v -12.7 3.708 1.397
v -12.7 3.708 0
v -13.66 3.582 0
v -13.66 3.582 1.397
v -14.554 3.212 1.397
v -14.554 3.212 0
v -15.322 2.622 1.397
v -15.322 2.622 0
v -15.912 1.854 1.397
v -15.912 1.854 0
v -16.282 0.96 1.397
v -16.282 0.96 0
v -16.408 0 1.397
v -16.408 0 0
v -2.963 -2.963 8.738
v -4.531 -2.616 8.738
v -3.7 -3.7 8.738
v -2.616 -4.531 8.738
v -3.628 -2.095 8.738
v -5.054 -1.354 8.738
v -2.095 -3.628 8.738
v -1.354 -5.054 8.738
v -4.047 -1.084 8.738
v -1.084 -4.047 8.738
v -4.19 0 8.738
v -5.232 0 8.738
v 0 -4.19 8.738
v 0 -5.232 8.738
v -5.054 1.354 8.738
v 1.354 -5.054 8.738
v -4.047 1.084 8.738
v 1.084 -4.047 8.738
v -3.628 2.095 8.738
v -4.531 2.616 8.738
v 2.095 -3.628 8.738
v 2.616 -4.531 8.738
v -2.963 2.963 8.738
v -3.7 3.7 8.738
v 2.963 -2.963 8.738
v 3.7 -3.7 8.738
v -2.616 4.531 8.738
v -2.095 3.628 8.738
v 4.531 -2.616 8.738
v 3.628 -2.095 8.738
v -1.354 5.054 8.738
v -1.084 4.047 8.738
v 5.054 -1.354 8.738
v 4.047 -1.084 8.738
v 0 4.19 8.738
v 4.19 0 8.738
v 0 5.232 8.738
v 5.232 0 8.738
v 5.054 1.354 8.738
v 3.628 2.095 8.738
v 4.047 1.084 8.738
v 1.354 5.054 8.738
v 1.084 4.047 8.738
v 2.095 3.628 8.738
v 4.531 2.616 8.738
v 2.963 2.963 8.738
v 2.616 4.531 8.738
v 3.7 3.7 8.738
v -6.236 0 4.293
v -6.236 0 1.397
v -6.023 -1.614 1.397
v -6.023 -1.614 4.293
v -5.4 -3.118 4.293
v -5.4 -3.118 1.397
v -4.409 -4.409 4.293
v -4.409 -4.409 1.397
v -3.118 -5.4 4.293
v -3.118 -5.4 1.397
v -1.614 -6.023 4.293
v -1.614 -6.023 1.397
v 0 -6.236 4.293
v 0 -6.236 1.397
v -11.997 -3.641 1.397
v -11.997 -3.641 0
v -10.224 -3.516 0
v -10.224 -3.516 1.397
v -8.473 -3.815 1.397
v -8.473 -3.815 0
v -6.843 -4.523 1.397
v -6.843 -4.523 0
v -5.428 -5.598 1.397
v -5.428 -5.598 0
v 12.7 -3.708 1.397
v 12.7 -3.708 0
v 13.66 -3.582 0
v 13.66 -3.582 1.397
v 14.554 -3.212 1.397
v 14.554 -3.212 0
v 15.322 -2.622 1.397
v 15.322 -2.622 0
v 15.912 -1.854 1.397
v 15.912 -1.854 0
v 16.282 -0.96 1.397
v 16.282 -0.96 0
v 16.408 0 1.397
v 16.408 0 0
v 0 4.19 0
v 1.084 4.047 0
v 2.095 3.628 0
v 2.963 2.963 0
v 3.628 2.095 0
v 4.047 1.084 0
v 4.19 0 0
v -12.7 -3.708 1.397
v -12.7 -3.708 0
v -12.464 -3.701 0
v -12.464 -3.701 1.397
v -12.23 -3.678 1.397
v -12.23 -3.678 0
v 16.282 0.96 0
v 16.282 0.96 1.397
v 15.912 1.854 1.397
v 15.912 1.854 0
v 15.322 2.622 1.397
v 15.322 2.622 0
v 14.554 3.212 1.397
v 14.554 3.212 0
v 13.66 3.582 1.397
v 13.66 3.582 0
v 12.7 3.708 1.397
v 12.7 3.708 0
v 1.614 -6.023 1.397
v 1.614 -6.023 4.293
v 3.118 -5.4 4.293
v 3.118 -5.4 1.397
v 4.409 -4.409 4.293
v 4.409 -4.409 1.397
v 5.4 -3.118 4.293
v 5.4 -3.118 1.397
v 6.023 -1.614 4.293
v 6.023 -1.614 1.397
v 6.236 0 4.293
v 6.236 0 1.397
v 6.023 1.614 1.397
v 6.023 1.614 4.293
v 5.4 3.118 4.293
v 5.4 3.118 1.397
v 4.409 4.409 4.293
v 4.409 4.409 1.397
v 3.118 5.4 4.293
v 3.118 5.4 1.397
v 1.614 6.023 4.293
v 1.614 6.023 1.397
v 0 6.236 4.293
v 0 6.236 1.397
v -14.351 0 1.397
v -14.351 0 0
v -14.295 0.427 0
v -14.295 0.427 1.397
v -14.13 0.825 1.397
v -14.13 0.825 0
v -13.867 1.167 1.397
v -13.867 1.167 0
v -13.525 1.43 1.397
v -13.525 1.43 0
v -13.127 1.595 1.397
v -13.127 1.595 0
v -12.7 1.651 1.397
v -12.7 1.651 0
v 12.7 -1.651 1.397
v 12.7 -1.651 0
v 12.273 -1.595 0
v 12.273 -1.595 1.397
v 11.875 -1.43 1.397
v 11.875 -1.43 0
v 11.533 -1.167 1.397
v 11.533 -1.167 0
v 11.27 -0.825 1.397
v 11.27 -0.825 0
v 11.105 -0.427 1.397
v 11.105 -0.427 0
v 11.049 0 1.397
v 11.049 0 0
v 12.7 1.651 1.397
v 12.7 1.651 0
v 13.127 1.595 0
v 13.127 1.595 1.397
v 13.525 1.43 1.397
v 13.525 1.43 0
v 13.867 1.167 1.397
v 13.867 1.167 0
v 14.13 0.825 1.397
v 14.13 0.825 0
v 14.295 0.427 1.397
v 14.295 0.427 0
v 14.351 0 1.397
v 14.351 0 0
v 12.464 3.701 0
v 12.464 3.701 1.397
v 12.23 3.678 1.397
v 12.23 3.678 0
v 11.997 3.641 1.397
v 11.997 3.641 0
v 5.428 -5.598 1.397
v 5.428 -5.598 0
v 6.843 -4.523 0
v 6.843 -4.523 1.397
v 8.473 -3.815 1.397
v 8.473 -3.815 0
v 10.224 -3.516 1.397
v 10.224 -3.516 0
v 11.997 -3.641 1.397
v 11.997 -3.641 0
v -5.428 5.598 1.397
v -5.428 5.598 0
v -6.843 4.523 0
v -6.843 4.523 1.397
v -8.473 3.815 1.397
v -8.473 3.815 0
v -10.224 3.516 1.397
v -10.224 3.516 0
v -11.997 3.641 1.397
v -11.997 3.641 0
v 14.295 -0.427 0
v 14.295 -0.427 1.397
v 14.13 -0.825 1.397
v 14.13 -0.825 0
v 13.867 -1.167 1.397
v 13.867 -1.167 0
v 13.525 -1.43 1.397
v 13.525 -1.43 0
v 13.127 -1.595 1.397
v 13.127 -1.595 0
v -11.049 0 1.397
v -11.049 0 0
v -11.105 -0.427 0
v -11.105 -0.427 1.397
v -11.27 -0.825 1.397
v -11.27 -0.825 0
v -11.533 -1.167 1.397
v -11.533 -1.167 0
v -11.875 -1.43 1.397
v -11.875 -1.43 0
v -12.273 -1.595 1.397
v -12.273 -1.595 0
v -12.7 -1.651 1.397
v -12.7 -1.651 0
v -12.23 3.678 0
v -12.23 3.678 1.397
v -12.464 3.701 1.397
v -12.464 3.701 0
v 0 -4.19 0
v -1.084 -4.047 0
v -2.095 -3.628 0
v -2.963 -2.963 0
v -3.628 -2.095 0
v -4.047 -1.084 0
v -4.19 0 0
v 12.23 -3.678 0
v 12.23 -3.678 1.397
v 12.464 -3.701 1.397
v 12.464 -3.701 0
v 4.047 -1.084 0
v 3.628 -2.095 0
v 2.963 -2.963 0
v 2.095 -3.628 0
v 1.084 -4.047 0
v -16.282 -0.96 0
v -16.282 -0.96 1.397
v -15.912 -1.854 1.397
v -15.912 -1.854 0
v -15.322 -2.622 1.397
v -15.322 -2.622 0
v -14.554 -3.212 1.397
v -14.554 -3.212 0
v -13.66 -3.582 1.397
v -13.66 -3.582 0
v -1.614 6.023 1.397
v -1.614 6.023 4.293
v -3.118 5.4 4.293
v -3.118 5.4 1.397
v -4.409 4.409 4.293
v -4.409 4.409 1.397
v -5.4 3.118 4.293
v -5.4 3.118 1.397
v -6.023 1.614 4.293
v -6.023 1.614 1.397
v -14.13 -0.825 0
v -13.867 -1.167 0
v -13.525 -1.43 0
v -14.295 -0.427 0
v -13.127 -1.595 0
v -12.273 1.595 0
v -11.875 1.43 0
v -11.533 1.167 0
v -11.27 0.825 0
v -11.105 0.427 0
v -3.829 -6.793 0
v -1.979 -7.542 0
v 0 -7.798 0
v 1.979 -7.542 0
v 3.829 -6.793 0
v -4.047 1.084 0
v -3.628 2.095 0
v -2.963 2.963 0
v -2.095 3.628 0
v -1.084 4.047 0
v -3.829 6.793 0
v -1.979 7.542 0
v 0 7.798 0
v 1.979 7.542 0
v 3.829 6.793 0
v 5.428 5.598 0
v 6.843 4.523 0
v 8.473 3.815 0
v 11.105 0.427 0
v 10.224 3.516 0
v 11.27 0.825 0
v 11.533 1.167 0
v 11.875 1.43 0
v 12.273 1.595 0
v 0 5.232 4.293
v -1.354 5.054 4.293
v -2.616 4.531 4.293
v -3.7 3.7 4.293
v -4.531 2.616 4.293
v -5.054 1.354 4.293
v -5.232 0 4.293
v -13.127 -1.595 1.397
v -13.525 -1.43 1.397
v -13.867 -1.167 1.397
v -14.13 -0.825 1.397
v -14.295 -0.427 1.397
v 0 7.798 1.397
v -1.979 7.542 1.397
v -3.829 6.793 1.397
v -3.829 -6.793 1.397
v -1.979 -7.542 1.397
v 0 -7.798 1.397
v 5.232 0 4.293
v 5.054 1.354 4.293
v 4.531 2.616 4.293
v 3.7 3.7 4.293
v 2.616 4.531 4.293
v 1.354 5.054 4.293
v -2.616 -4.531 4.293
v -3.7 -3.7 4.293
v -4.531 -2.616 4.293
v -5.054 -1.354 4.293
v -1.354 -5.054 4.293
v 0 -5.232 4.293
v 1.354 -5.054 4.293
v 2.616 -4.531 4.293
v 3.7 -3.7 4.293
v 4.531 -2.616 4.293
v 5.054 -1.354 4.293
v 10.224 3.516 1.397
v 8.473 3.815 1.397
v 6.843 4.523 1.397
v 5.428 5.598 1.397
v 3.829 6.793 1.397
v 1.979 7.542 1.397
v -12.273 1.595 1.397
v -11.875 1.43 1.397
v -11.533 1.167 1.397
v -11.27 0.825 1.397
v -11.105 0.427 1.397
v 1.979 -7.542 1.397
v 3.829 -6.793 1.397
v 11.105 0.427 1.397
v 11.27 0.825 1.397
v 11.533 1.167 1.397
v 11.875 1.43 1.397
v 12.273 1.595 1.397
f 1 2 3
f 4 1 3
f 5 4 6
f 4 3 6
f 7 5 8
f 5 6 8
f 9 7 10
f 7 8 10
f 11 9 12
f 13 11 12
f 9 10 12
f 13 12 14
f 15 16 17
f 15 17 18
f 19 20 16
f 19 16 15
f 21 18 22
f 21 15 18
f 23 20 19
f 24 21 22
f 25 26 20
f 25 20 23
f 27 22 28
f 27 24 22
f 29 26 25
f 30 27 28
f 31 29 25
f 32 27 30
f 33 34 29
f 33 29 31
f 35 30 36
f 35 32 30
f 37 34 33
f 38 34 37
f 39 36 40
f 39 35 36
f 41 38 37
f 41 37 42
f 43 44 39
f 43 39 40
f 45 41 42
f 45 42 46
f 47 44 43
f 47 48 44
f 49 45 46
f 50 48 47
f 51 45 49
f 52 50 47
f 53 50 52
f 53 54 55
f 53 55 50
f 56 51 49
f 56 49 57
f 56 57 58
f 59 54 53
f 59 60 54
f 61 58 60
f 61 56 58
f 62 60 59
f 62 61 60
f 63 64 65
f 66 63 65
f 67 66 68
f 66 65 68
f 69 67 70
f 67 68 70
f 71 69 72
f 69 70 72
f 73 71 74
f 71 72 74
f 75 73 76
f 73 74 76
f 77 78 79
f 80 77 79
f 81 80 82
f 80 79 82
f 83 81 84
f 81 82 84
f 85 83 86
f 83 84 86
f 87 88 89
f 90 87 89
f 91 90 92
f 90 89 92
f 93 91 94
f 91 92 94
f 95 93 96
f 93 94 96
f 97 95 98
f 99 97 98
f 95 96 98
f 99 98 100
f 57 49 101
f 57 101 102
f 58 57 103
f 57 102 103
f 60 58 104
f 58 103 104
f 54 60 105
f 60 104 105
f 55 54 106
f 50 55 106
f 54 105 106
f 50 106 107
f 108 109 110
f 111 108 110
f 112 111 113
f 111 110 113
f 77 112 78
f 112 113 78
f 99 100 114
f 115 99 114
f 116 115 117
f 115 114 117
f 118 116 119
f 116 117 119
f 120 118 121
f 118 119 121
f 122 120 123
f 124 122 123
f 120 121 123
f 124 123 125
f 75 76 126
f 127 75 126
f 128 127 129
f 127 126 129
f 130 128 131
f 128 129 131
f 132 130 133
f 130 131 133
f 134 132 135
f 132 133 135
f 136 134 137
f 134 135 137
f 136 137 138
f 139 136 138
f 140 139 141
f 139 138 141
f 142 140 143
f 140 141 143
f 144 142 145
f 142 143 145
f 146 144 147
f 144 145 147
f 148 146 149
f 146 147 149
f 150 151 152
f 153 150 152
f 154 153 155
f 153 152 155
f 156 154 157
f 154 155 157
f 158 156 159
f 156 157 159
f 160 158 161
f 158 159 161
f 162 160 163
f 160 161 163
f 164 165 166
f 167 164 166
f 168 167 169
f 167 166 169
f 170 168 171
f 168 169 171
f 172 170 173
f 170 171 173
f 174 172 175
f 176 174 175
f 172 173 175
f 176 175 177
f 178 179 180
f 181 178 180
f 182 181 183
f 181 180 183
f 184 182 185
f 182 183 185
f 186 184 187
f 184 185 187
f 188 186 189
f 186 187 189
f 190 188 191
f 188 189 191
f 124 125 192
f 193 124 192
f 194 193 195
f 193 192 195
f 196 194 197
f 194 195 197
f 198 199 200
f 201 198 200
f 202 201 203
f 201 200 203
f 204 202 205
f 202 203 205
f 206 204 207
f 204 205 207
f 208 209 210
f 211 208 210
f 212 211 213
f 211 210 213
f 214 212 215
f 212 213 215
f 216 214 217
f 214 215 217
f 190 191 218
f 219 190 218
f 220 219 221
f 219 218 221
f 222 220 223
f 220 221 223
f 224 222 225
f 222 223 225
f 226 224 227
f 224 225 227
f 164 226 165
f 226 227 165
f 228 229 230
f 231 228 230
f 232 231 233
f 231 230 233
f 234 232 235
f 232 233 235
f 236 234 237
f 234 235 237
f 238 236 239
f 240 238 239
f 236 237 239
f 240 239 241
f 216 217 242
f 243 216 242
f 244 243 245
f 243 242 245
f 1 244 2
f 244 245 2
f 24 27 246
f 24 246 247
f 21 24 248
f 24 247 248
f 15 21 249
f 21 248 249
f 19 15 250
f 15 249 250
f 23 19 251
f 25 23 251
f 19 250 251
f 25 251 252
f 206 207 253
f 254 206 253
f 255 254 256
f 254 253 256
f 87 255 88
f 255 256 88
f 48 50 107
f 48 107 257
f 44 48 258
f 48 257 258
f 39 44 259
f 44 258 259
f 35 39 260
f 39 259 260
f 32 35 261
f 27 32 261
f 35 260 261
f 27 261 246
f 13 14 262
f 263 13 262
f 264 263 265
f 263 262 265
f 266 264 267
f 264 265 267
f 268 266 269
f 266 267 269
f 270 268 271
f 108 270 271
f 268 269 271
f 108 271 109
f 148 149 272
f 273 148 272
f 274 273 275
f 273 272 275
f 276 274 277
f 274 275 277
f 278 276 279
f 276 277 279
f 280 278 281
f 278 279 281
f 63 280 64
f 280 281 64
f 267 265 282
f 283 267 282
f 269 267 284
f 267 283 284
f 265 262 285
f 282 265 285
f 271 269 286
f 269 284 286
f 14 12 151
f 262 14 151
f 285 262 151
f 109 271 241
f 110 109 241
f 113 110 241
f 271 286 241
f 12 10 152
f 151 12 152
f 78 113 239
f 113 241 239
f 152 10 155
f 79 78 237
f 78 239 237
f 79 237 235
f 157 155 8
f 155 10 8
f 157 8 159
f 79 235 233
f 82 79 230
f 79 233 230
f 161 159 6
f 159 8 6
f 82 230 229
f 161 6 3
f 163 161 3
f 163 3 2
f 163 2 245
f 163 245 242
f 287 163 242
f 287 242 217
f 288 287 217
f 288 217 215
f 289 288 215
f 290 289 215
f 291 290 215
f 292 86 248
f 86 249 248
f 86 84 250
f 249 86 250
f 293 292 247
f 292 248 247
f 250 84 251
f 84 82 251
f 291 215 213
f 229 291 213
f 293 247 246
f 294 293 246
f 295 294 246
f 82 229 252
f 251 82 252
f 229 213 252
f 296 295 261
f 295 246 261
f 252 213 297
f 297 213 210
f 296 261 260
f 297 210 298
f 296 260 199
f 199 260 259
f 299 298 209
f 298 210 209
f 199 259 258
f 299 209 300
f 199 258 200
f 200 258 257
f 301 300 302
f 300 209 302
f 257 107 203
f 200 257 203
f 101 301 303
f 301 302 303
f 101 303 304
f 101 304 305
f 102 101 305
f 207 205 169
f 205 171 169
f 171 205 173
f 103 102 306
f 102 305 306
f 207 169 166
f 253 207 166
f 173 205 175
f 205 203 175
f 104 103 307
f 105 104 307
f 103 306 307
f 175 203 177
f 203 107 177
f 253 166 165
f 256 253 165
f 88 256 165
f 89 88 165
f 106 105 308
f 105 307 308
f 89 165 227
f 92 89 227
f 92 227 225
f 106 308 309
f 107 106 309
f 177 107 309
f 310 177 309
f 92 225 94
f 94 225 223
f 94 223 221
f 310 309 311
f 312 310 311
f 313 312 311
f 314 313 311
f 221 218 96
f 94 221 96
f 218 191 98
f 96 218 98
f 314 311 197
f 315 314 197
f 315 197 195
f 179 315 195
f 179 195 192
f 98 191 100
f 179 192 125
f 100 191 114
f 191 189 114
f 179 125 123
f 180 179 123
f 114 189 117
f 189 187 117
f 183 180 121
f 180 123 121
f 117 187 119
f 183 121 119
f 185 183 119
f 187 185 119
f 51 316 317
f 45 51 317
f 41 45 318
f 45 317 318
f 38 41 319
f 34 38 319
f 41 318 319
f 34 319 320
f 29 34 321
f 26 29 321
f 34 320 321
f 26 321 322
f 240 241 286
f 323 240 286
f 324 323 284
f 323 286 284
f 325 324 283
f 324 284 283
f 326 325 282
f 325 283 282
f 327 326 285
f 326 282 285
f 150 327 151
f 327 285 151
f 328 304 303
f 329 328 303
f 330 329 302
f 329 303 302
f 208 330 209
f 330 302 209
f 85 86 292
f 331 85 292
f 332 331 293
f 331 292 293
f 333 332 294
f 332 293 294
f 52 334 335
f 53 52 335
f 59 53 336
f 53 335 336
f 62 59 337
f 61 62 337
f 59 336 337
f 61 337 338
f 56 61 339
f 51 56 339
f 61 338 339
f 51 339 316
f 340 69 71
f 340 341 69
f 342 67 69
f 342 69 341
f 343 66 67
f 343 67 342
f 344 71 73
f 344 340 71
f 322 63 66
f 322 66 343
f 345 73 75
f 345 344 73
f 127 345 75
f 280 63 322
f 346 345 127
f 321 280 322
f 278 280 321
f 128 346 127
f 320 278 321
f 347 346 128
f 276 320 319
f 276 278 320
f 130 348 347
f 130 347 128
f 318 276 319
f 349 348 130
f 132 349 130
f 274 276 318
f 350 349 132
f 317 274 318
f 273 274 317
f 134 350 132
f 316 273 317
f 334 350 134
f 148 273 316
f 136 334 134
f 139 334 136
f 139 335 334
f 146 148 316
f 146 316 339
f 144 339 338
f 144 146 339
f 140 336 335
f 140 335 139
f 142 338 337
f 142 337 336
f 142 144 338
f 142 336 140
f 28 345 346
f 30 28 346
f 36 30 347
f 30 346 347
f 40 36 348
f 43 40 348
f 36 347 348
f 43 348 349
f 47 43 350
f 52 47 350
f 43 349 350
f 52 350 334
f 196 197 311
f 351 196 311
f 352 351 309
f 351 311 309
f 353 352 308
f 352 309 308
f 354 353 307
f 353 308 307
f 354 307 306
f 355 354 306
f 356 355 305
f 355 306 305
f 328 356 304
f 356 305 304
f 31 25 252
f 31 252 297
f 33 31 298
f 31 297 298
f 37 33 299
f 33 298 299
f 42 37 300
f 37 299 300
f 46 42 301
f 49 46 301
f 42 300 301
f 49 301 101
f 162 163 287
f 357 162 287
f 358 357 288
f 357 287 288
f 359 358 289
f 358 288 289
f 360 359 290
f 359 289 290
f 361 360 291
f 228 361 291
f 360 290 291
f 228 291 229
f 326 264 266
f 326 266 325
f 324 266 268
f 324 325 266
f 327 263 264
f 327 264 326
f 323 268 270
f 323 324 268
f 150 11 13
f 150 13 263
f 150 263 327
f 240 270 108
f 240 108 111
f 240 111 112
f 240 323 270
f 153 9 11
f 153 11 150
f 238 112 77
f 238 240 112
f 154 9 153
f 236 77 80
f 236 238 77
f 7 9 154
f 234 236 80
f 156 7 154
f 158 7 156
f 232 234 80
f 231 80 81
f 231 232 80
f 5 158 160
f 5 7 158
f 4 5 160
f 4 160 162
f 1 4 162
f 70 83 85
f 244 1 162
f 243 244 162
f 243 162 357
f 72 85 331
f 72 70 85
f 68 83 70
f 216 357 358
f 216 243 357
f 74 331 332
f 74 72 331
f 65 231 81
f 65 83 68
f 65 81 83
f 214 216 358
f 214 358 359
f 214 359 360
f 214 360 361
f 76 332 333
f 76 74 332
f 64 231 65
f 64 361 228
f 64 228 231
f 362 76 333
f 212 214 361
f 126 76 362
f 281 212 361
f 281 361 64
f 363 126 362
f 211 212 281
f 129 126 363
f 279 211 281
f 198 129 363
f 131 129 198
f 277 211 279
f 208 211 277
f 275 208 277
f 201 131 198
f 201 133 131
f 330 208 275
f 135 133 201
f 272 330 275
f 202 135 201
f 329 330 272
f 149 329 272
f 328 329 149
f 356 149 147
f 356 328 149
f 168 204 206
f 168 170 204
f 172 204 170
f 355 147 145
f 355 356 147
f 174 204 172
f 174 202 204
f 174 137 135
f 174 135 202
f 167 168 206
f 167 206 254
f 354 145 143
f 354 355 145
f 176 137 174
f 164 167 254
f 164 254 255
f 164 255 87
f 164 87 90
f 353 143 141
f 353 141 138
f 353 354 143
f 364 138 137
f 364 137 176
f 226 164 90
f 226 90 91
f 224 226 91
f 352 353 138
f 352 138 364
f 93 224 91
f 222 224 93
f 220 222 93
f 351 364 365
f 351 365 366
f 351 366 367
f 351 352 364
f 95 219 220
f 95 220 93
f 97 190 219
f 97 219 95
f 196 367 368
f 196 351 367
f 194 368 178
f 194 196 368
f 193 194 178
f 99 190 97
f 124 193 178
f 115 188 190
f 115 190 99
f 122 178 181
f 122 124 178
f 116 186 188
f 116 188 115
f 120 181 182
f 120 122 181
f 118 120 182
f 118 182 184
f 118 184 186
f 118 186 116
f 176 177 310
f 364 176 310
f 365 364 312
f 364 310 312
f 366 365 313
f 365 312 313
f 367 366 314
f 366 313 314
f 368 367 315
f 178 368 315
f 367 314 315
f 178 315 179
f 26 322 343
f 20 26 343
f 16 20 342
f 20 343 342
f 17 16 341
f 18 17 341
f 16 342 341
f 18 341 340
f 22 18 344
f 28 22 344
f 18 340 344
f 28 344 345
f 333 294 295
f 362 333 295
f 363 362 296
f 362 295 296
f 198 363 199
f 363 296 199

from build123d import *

# Parameters (mm, degrees)
F1_DEPTH = 1.397
F2_DEPTH = 8.7376
F3_DEPTH = 4.2926


# Not quite as in the source:
# - ends of sketch curves that miss each other by under 0.0002 mm in the source are joined


with BuildPart() as f1:
    # F0 (on Top) → F1 (new body)
    with BuildSketch(Plane.XY):
        with BuildLine():
            ThreePointArc((-6.2357, 0), (-4.4093057554, 4.4093057554), (0, 6.2357))
            Line((0, 6.2357), (0, 7.7978))
            ThreePointArc((0, 7.7978), (-2.9283023582, 7.2270831003), (-5.4279628833, 5.5984733435))
            ThreePointArc((-5.4279628833, 5.5984733435), (-8.4727612853, 3.8154532948), (-11.9969014896, 3.6411465506))
            ThreePointArc((-11.9969014896, 3.6411465506), (-12.3468465773, 3.6915461828), (-12.7, 3.7084))
            Line((-12.7, 3.7084), (-12.7, 1.651))
            ThreePointArc((-12.7, 1.651), (-11.5325667043, 1.1674332957), (-11.049, 0))
            Line((-11.049, 0), (-6.2357, 0))
        make_face()
        with BuildLine():
            ThreePointArc((-14.351, 0), (-13.8674332957, 1.1674332957), (-12.7, 1.651))
            Line((-12.7, 1.651), (-12.7, 3.7084))
            ThreePointArc((-12.7, 3.7084), (-15.3222347874, 2.6222347874), (-16.4084, 0))
            Line((-16.4084, 0), (-14.351, 0))
        make_face()
        with BuildLine():
            Line((-12.7, -3.7084), (-12.7, -1.651))
            ThreePointArc((-12.7, -1.651), (-13.8674332957, -1.1674332957), (-14.351, 0))
            Line((-14.351, 0), (-16.4084, 0))
            ThreePointArc((-16.4084, 0), (-15.3222347874, -2.6222347874), (-12.7, -3.7084))
        make_face()
        with BuildLine():
            Line((0, -7.7978), (0, -6.2357))
            ThreePointArc((0, -6.2357), (-4.4093057554, -4.4093057554), (-6.2357, 0))
            Line((-6.2357, 0), (-11.049, 0))
            ThreePointArc((-11.049, 0), (-11.5325667043, -1.1674332957), (-12.7, -1.651))
            Line((-12.7, -1.651), (-12.7, -3.7084))
            ThreePointArc((-12.7, -3.7084), (-12.3468465773, -3.6915461828), (-11.9969031552, -3.6411379247))
            ThreePointArc((-11.9969031552, -3.6411379247), (-8.4727612853, -3.8154532948), (-5.4279673549, -5.5984779556))
            ThreePointArc((-5.4279673549, -5.5984779556), (-2.9283023582, -7.2270831003), (0, -7.7978))
        make_face()
        with BuildLine():
            ThreePointArc((0, -6.2357), (4.4093057554, -4.4093057554), (6.2357, 0))
            Line((6.2357, 0), (5.2324, 0))
            ThreePointArc((5.2324, 0), (3.6998655219, -3.6998655219), (0, -5.2324))
            Line((0, -5.2324), (0, -6.2357))
        make_face()
        with BuildLine():
            ThreePointArc((-6.2357, 0), (-4.4093057554, -4.4093057554), (0, -6.2357))
            Line((0, -6.2357), (0, -5.2324))
            ThreePointArc((0, -5.2324), (-3.6998655219, -3.6998655219), (-5.2324, 0))
            Line((-5.2324, 0), (-6.2357, 0))
        make_face()
        with BuildLine():
            Line((0, 5.2324), (0, 6.2357))
            ThreePointArc((0, 6.2357), (-4.4093057554, 4.4093057554), (-6.2357, 0))
            Line((-6.2357, 0), (-5.2324, 0))
            ThreePointArc((-5.2324, 0), (-3.6998655219, 3.6998655219), (0, 5.2324))
        make_face()
        with BuildLine():
            Line((5.2324, 0), (6.2357, 0))
            ThreePointArc((6.2357, 0), (4.4093057554, 4.4093057554), (0, 6.2357))
            Line((0, 6.2357), (0, 5.2324))
            ThreePointArc((0, 5.2324), (3.6998655219, 3.6998655219), (5.2324, 0))
        make_face()
        with BuildLine():
            ThreePointArc((0, 6.2357), (4.4093057554, 4.4093057554), (6.2357, 0))
            Line((6.2357, 0), (11.049, 0))
            ThreePointArc((11.049, 0), (11.5325667043, 1.1674332957), (12.7, 1.651))
            Line((12.7, 1.651), (12.7, 3.7084))
            ThreePointArc((12.7, 3.7084), (12.3468465773, 3.6915461828), (11.9969031552, 3.6411379247))
            ThreePointArc((11.9969031552, 3.6411379247), (8.4727612853, 3.8154532948), (5.4279673549, 5.5984779556))
            ThreePointArc((5.4279673549, 5.5984779556), (2.9283023582, 7.2270831003), (0, 7.7978))
            Line((0, 7.7978), (0, 6.2357))
        make_face()
        with BuildLine():
            Line((11.049, 0), (6.2357, 0))
            ThreePointArc((6.2357, 0), (4.4093057554, -4.4093057554), (0, -6.2357))
            Line((0, -6.2357), (0, -7.7978))
            ThreePointArc((0, -7.7978), (2.9283023582, -7.2270831003), (5.4279628833, -5.5984733435))
            ThreePointArc((5.4279628833, -5.5984733435), (8.4727612853, -3.8154532948), (11.9969014896, -3.6411465506))
            ThreePointArc((11.9969014896, -3.6411465506), (12.3468465773, -3.6915461828), (12.7, -3.7084))
            Line((12.7, -3.7084), (12.7, -1.651))
            ThreePointArc((12.7, -1.651), (11.5325667043, -1.1674332957), (11.049, 0))
        make_face()
        with BuildLine():
            ThreePointArc((14.351, 0), (13.8674332957, -1.1674332957), (12.7, -1.651))
            Line((12.7, -1.651), (12.7, -3.7084))
            ThreePointArc((12.7, -3.7084), (15.3222347874, -2.6222347874), (16.4084, 0))
            Line((16.4084, 0), (14.351, 0))
        make_face()
        with BuildLine():
            Line((12.7, 3.7084), (12.7, 1.651))
            ThreePointArc((12.7, 1.651), (13.8674332957, 1.1674332957), (14.351, 0))
            Line((14.351, 0), (16.4084, 0))
            ThreePointArc((16.4084, 0), (15.3222347874, 2.6222347874), (12.7, 3.7084))
        make_face()
    extrude(amount=F1_DEPTH)

    # F0 (on Top) → F2 (join)
    with BuildSketch(Plane.XY):
        with BuildLine():
            Line((0, 4.18973), (0, 5.2324))
            ThreePointArc((0, 5.2324), (-3.6998655219, 3.6998655219), (-5.2324, 0))
            Line((-5.2324, 0), (-4.18973, 0))
            ThreePointArc((-4.18973, 0), (-2.9625864943, 2.9625864943), (0, 4.18973))
        make_face()
        with BuildLine():
            Line((4.18973, 0), (5.2324, 0))
            ThreePointArc((5.2324, 0), (3.6998655219, 3.6998655219), (0, 5.2324))
            Line((0, 5.2324), (0, 4.18973))
            ThreePointArc((0, 4.18973), (2.9625864943, 2.9625864943), (4.18973, 0))
        make_face()
        with BuildLine():
            ThreePointArc((0, -5.2324), (3.6998655219, -3.6998655219), (5.2324, 0))
            Line((5.2324, 0), (4.18973, 0))
            ThreePointArc((4.18973, 0), (2.9625864943, -2.9625864943), (0, -4.18973))
            Line((0, -4.18973), (0, -5.2324))
        make_face()
        with BuildLine():
            ThreePointArc((-5.2324, 0), (-3.6998655219, -3.6998655219), (0, -5.2324))
            Line((0, -5.2324), (0, -4.18973))
            ThreePointArc((0, -4.18973), (-2.9625864943, -2.9625864943), (-4.18973, 0))
            Line((-4.18973, 0), (-5.2324, 0))
        make_face()
    extrude(amount=F2_DEPTH)

    # F0 (on Top) → F3 (join)
    with BuildSketch(Plane.XY):
        with BuildLine():
            ThreePointArc((-6.2357, 0), (-4.4093057554, -4.4093057554), (0, -6.2357))
            Line((0, -6.2357), (0, -5.2324))
            ThreePointArc((0, -5.2324), (-3.6998655219, -3.6998655219), (-5.2324, 0))
            Line((-5.2324, 0), (-6.2357, 0))
        make_face()
        with BuildLine():
            ThreePointArc((0, -6.2357), (4.4093057554, -4.4093057554), (6.2357, 0))
            Line((6.2357, 0), (5.2324, 0))
            ThreePointArc((5.2324, 0), (3.6998655219, -3.6998655219), (0, -5.2324))
            Line((0, -5.2324), (0, -6.2357))
        make_face()
        with BuildLine():
            Line((5.2324, 0), (6.2357, 0))
            ThreePointArc((6.2357, 0), (4.4093057554, 4.4093057554), (0, 6.2357))
            Line((0, 6.2357), (0, 5.2324))
            ThreePointArc((0, 5.2324), (3.6998655219, 3.6998655219), (5.2324, 0))
        make_face()
        with BuildLine():
            Line((0, 5.2324), (0, 6.2357))
            ThreePointArc((0, 6.2357), (-4.4093057554, 4.4093057554), (-6.2357, 0))
            Line((-6.2357, 0), (-5.2324, 0))
            ThreePointArc((-5.2324, 0), (-3.6998655219, 3.6998655219), (0, 5.2324))
        make_face()
    extrude(amount=F3_DEPTH)


solid = f1.part
